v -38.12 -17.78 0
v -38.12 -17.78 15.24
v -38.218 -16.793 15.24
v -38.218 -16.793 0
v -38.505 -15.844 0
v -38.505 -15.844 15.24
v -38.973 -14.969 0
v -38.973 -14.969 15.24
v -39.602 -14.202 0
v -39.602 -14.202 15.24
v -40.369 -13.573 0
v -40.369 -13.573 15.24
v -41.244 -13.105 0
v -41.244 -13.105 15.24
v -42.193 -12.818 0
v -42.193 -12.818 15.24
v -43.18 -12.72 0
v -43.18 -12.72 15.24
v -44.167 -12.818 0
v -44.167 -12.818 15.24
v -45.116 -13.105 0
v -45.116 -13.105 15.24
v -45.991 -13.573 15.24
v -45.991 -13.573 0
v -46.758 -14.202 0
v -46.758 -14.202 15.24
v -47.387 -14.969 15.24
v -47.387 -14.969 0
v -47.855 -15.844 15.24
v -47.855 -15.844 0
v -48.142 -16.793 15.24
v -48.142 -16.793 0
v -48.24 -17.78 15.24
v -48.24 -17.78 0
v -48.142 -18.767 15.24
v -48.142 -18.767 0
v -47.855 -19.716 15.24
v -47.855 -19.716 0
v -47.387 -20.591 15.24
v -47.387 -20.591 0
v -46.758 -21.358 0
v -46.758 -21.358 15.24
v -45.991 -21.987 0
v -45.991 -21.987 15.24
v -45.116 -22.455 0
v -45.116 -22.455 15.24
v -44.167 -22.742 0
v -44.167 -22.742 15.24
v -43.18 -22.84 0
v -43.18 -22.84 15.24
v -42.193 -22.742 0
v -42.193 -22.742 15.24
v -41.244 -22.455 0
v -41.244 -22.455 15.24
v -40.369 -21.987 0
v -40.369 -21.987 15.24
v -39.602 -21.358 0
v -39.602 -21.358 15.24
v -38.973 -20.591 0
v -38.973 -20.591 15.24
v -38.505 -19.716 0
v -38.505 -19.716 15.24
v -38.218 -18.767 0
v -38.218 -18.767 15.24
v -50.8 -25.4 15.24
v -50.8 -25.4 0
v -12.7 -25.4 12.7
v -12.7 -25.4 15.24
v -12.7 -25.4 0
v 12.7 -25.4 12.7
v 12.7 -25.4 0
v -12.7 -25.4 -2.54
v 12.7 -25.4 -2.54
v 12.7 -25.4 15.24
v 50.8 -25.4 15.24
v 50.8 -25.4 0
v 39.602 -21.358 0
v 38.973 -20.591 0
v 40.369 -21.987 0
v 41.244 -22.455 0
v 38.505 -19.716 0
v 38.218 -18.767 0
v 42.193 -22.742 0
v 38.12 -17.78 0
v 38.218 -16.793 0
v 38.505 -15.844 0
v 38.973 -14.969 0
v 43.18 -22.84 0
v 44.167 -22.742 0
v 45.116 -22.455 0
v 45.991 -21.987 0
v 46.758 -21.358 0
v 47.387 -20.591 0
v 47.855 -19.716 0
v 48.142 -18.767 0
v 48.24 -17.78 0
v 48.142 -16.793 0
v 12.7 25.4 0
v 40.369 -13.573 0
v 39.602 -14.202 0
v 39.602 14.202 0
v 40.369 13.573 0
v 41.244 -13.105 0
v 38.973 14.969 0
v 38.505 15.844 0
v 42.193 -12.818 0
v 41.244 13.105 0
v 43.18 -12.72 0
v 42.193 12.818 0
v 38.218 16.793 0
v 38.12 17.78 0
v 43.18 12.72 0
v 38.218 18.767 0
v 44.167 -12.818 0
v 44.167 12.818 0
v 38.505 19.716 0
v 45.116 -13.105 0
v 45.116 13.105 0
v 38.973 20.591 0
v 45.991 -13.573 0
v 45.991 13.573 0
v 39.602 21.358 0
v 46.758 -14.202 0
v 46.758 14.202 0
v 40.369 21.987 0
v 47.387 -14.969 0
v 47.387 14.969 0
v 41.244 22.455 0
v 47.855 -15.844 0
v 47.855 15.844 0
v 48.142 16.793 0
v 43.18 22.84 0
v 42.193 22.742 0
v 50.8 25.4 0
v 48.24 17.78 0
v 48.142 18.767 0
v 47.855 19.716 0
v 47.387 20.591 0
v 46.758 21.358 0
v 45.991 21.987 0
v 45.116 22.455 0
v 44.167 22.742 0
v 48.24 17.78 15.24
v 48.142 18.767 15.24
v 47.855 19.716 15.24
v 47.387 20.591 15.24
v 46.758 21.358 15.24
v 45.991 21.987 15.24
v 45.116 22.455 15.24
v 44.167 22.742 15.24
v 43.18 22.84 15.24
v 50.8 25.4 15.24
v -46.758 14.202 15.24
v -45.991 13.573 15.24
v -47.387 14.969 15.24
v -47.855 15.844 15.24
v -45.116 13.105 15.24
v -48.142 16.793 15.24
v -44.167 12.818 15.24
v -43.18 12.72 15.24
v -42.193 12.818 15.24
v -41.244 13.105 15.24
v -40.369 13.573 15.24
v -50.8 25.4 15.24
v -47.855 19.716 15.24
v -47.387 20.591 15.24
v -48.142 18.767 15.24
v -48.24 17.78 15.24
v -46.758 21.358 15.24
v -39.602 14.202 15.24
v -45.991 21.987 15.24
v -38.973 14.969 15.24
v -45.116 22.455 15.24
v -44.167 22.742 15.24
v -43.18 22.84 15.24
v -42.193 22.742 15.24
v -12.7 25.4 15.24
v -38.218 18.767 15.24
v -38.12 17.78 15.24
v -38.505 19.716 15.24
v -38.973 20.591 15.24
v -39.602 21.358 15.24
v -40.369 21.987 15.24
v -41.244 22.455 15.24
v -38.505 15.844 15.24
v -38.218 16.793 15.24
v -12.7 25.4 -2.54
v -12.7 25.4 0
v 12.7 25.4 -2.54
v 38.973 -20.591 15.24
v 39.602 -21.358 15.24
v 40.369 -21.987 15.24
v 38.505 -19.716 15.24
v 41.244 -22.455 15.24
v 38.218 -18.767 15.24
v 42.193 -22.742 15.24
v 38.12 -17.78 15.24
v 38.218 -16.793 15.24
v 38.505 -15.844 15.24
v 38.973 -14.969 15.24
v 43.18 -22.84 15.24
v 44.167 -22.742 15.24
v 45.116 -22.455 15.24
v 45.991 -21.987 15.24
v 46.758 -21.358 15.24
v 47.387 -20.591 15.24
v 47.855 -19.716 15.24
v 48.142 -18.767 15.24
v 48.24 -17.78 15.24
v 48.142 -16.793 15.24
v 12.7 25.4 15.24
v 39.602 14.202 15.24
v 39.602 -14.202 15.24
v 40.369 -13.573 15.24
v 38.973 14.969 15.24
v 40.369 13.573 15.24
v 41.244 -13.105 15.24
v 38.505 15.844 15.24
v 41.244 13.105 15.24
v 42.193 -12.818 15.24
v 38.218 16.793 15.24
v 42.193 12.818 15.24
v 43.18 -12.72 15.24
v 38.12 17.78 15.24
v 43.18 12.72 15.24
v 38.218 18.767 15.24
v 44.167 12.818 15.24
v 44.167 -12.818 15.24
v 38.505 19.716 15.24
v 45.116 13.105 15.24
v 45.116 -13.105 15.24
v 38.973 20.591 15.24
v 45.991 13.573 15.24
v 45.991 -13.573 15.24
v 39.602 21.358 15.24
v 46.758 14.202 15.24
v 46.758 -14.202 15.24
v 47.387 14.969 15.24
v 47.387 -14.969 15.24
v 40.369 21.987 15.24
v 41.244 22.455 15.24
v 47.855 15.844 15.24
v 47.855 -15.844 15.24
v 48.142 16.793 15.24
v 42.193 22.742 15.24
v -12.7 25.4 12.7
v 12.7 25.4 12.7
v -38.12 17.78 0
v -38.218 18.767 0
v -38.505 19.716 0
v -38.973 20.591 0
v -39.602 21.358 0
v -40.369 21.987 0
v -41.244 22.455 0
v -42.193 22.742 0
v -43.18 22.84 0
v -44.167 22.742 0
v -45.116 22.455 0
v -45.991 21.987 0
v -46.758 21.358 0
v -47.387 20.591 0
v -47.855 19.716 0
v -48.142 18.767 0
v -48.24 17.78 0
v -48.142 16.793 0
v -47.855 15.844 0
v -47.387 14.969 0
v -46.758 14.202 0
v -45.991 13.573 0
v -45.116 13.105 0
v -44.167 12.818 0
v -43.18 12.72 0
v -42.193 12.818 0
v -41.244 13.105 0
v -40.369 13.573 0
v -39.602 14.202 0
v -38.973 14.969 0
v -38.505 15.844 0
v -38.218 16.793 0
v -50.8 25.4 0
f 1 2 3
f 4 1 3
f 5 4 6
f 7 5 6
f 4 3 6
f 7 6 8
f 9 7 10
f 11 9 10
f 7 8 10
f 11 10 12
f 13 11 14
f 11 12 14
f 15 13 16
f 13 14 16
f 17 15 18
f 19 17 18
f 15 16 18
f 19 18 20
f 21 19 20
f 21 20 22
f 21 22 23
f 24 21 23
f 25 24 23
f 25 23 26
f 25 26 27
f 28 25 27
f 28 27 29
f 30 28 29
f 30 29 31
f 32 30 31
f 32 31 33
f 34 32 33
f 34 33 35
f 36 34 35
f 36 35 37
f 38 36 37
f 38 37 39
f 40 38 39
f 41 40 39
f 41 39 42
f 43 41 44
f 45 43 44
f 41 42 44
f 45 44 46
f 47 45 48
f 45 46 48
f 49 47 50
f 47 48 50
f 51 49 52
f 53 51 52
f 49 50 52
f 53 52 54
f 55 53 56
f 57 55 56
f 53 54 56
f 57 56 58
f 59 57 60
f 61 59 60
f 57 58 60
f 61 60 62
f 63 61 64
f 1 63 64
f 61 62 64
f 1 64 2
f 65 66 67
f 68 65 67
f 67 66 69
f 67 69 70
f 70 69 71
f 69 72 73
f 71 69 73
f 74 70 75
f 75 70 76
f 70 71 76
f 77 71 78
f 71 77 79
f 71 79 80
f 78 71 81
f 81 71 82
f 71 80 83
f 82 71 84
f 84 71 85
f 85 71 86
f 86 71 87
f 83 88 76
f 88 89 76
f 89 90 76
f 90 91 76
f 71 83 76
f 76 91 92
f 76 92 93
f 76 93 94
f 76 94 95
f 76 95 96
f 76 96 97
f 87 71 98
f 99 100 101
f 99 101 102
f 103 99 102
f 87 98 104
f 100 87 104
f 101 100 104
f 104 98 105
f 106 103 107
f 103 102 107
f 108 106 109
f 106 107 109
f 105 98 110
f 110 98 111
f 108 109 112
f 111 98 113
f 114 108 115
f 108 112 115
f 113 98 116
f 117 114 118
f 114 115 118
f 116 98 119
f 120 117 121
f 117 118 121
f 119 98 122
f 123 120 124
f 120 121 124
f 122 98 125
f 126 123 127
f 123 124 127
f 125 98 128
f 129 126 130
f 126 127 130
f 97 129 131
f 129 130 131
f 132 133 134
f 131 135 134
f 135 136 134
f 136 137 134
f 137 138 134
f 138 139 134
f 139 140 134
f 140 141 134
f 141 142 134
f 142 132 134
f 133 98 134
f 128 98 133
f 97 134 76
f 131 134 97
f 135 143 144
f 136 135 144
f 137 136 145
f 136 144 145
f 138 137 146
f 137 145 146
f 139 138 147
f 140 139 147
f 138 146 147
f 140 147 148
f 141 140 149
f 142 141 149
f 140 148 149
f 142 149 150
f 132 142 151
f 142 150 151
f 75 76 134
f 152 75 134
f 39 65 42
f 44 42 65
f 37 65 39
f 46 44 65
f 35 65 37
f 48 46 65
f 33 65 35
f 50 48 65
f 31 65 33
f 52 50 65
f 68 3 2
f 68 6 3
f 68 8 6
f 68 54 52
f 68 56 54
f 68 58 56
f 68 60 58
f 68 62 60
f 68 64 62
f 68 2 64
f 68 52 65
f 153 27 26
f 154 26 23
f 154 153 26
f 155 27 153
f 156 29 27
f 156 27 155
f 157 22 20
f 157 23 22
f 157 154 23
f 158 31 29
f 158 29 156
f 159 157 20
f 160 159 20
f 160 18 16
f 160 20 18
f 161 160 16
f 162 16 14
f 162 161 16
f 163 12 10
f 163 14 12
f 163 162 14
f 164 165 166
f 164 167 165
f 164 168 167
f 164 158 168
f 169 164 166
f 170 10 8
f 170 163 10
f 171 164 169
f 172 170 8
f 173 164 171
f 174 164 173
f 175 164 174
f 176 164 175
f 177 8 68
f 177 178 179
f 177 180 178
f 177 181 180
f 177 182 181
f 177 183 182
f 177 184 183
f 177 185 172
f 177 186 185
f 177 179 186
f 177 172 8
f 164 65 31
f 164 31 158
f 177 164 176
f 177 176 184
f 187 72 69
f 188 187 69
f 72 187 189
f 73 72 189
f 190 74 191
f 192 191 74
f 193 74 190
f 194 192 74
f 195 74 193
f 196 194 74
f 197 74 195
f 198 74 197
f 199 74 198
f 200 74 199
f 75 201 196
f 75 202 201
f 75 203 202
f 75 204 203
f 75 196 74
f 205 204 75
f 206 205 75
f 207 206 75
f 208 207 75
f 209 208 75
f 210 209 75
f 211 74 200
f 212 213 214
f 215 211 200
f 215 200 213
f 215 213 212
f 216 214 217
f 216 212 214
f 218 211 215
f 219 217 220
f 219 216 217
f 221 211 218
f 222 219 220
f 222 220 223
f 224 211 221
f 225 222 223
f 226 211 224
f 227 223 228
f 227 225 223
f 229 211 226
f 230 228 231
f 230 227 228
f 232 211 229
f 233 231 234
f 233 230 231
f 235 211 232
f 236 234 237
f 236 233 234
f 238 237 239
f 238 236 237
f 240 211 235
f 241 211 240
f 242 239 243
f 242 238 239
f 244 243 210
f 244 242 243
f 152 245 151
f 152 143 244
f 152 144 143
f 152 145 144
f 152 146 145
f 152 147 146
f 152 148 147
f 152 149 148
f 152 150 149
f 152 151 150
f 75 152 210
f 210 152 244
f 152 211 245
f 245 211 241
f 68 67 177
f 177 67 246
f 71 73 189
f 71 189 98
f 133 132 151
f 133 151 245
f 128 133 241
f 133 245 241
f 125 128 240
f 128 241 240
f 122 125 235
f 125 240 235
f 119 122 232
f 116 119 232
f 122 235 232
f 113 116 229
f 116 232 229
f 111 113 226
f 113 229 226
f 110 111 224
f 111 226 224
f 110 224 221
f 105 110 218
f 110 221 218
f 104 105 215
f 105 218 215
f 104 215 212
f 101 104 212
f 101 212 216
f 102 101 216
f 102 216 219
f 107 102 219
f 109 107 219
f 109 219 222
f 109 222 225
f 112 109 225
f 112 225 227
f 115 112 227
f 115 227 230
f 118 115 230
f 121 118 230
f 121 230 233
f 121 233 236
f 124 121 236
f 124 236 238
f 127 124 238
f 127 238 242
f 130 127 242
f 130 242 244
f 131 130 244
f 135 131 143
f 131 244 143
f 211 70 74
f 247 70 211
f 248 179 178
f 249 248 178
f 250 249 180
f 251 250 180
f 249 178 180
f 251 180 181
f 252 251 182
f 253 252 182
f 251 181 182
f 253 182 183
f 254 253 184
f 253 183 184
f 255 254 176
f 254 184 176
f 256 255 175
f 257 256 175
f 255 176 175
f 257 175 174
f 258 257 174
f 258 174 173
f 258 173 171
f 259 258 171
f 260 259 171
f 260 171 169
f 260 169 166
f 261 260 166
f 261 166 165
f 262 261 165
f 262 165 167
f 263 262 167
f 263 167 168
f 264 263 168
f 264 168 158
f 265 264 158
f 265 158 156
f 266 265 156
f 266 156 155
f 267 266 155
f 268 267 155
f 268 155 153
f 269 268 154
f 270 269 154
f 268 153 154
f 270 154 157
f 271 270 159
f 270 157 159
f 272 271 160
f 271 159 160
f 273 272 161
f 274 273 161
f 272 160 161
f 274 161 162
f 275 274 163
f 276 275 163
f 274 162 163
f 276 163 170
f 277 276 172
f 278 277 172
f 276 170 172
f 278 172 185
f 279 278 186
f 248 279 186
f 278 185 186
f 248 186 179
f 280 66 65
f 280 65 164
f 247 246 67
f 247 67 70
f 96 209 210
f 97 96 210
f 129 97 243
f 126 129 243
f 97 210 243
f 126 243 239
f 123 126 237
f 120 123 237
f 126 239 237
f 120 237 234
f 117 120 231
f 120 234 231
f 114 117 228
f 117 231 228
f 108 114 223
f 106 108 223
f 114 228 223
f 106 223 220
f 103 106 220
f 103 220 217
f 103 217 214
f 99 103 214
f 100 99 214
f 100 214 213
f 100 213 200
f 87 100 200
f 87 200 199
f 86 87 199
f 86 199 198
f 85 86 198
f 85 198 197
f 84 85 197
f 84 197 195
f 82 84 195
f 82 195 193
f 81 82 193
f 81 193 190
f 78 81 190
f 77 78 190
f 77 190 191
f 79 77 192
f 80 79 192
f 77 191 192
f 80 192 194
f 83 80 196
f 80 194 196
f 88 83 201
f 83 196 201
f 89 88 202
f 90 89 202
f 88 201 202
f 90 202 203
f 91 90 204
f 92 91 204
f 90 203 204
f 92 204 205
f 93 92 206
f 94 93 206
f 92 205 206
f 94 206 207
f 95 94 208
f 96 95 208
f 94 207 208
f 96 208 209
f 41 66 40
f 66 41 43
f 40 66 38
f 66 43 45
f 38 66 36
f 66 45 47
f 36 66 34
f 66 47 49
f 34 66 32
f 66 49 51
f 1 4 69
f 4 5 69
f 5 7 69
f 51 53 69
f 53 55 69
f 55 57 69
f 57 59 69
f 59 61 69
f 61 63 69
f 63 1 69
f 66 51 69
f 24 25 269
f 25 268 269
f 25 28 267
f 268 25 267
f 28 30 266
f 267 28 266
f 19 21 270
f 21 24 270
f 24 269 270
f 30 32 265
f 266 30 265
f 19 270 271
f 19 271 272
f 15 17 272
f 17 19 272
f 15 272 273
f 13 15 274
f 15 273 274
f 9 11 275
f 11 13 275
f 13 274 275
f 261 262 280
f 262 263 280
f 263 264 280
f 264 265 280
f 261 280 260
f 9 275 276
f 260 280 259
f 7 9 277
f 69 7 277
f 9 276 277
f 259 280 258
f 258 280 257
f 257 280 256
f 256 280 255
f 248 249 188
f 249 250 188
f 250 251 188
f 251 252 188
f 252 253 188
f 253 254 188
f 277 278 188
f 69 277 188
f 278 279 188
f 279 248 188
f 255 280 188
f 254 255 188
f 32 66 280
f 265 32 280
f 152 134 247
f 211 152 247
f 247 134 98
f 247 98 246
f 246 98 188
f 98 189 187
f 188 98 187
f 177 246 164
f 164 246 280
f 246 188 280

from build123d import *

# Parameters (mm, degrees)
F0_W     = 38.1
F0_H     = 50.8
F0_W_2   = 25.4
F1_DEPTH = 12.7
F2_DEPTH = 15.24
F5_W     = 12.7
F5_H     = 2.54
F6_DEPTH = 50.8
F7_R     = 5.059721
F8_DEPTH = 17.781


with BuildPart() as f1:
    # F0 (on Top) → F1 (new body)
    with BuildSketch(Plane.XY):
        with Locations((-31.75, 0)):
            Rectangle(F0_W, F0_H)
        Rectangle(F0_W_2, F0_H)
        with Locations((31.75, 0)):
            Rectangle(F0_W, F0_H)
    extrude(amount=F1_DEPTH)

    # F0 (on Top) → F2 (join)
    with BuildSketch(Plane.XY):
        with Locations((31.75, 0)):
            Rectangle(F0_W, F0_H)
        with Locations((-31.75, 0)):
            Rectangle(F0_W, F0_H)
    extrude(amount=F2_DEPTH)

    # F5 (on face) → F6 (join)
    with BuildSketch(Plane.XZ.offset(25.4)):
        with Locations((-6.35, -1.27)):
            Rectangle(F5_W, F5_H)
        with Locations((6.35, -1.27)):
            Rectangle(F5_W, F5_H)
    extrude(amount=-F6_DEPTH)

    # F7 (on face) → F8 (cut, through all)
    with BuildSketch(Plane.XY.offset(15.24)):
        with BuildLine():
            ThreePointArc((43.18, 22.839721), (39.602237, 14.202237), (48.239721, 17.78))
            ThreePointArc((48.239721, 17.78), (46.757763, 21.357763), (43.18, 22.839721))
        make_face()
        with Locations((43.18, -17.78)):
            Circle(F7_R)
        with Locations((-43.18, 17.78)):
            Circle(F7_R)
        with Locations((-43.18, -17.78)):
            Circle(F7_R)
    extrude(amount=-F8_DEPTH, mode=Mode.SUBTRACT)


solid = f1.part
